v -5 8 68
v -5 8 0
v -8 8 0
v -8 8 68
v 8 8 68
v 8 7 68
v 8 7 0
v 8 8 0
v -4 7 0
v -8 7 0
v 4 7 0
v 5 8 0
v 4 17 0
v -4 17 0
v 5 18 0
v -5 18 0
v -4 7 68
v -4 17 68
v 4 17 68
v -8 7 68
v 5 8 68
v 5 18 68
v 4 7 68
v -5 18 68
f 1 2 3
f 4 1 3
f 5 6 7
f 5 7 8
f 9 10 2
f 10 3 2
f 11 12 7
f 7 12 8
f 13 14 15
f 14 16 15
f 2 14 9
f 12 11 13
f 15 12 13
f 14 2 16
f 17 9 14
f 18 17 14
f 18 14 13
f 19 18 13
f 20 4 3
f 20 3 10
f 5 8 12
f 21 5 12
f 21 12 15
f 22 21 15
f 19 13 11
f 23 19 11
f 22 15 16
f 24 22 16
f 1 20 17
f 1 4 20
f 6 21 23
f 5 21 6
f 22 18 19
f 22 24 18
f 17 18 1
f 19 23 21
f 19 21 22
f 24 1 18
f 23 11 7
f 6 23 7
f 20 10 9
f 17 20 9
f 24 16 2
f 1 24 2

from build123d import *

# Parameters (mm, degrees)
F_10_MM_DEEP_HAT_SECTION_DEPTH = 68


with BuildPart() as part:
    # 10 mm deep hat section profile → 10 mm deep hat section (new body)
    with BuildSketch(Plane.XY):
        Polygon((-8, 7), (-4, 7), (-4, 17), (4, 17), (4, 7), (8, 7), (8, 8), (5, 8), (5, 18), (-5, 18), (-5, 8), (-8, 8), align=None)
    extrude(amount=F_10_MM_DEEP_HAT_SECTION_DEPTH)


solid = part.part
